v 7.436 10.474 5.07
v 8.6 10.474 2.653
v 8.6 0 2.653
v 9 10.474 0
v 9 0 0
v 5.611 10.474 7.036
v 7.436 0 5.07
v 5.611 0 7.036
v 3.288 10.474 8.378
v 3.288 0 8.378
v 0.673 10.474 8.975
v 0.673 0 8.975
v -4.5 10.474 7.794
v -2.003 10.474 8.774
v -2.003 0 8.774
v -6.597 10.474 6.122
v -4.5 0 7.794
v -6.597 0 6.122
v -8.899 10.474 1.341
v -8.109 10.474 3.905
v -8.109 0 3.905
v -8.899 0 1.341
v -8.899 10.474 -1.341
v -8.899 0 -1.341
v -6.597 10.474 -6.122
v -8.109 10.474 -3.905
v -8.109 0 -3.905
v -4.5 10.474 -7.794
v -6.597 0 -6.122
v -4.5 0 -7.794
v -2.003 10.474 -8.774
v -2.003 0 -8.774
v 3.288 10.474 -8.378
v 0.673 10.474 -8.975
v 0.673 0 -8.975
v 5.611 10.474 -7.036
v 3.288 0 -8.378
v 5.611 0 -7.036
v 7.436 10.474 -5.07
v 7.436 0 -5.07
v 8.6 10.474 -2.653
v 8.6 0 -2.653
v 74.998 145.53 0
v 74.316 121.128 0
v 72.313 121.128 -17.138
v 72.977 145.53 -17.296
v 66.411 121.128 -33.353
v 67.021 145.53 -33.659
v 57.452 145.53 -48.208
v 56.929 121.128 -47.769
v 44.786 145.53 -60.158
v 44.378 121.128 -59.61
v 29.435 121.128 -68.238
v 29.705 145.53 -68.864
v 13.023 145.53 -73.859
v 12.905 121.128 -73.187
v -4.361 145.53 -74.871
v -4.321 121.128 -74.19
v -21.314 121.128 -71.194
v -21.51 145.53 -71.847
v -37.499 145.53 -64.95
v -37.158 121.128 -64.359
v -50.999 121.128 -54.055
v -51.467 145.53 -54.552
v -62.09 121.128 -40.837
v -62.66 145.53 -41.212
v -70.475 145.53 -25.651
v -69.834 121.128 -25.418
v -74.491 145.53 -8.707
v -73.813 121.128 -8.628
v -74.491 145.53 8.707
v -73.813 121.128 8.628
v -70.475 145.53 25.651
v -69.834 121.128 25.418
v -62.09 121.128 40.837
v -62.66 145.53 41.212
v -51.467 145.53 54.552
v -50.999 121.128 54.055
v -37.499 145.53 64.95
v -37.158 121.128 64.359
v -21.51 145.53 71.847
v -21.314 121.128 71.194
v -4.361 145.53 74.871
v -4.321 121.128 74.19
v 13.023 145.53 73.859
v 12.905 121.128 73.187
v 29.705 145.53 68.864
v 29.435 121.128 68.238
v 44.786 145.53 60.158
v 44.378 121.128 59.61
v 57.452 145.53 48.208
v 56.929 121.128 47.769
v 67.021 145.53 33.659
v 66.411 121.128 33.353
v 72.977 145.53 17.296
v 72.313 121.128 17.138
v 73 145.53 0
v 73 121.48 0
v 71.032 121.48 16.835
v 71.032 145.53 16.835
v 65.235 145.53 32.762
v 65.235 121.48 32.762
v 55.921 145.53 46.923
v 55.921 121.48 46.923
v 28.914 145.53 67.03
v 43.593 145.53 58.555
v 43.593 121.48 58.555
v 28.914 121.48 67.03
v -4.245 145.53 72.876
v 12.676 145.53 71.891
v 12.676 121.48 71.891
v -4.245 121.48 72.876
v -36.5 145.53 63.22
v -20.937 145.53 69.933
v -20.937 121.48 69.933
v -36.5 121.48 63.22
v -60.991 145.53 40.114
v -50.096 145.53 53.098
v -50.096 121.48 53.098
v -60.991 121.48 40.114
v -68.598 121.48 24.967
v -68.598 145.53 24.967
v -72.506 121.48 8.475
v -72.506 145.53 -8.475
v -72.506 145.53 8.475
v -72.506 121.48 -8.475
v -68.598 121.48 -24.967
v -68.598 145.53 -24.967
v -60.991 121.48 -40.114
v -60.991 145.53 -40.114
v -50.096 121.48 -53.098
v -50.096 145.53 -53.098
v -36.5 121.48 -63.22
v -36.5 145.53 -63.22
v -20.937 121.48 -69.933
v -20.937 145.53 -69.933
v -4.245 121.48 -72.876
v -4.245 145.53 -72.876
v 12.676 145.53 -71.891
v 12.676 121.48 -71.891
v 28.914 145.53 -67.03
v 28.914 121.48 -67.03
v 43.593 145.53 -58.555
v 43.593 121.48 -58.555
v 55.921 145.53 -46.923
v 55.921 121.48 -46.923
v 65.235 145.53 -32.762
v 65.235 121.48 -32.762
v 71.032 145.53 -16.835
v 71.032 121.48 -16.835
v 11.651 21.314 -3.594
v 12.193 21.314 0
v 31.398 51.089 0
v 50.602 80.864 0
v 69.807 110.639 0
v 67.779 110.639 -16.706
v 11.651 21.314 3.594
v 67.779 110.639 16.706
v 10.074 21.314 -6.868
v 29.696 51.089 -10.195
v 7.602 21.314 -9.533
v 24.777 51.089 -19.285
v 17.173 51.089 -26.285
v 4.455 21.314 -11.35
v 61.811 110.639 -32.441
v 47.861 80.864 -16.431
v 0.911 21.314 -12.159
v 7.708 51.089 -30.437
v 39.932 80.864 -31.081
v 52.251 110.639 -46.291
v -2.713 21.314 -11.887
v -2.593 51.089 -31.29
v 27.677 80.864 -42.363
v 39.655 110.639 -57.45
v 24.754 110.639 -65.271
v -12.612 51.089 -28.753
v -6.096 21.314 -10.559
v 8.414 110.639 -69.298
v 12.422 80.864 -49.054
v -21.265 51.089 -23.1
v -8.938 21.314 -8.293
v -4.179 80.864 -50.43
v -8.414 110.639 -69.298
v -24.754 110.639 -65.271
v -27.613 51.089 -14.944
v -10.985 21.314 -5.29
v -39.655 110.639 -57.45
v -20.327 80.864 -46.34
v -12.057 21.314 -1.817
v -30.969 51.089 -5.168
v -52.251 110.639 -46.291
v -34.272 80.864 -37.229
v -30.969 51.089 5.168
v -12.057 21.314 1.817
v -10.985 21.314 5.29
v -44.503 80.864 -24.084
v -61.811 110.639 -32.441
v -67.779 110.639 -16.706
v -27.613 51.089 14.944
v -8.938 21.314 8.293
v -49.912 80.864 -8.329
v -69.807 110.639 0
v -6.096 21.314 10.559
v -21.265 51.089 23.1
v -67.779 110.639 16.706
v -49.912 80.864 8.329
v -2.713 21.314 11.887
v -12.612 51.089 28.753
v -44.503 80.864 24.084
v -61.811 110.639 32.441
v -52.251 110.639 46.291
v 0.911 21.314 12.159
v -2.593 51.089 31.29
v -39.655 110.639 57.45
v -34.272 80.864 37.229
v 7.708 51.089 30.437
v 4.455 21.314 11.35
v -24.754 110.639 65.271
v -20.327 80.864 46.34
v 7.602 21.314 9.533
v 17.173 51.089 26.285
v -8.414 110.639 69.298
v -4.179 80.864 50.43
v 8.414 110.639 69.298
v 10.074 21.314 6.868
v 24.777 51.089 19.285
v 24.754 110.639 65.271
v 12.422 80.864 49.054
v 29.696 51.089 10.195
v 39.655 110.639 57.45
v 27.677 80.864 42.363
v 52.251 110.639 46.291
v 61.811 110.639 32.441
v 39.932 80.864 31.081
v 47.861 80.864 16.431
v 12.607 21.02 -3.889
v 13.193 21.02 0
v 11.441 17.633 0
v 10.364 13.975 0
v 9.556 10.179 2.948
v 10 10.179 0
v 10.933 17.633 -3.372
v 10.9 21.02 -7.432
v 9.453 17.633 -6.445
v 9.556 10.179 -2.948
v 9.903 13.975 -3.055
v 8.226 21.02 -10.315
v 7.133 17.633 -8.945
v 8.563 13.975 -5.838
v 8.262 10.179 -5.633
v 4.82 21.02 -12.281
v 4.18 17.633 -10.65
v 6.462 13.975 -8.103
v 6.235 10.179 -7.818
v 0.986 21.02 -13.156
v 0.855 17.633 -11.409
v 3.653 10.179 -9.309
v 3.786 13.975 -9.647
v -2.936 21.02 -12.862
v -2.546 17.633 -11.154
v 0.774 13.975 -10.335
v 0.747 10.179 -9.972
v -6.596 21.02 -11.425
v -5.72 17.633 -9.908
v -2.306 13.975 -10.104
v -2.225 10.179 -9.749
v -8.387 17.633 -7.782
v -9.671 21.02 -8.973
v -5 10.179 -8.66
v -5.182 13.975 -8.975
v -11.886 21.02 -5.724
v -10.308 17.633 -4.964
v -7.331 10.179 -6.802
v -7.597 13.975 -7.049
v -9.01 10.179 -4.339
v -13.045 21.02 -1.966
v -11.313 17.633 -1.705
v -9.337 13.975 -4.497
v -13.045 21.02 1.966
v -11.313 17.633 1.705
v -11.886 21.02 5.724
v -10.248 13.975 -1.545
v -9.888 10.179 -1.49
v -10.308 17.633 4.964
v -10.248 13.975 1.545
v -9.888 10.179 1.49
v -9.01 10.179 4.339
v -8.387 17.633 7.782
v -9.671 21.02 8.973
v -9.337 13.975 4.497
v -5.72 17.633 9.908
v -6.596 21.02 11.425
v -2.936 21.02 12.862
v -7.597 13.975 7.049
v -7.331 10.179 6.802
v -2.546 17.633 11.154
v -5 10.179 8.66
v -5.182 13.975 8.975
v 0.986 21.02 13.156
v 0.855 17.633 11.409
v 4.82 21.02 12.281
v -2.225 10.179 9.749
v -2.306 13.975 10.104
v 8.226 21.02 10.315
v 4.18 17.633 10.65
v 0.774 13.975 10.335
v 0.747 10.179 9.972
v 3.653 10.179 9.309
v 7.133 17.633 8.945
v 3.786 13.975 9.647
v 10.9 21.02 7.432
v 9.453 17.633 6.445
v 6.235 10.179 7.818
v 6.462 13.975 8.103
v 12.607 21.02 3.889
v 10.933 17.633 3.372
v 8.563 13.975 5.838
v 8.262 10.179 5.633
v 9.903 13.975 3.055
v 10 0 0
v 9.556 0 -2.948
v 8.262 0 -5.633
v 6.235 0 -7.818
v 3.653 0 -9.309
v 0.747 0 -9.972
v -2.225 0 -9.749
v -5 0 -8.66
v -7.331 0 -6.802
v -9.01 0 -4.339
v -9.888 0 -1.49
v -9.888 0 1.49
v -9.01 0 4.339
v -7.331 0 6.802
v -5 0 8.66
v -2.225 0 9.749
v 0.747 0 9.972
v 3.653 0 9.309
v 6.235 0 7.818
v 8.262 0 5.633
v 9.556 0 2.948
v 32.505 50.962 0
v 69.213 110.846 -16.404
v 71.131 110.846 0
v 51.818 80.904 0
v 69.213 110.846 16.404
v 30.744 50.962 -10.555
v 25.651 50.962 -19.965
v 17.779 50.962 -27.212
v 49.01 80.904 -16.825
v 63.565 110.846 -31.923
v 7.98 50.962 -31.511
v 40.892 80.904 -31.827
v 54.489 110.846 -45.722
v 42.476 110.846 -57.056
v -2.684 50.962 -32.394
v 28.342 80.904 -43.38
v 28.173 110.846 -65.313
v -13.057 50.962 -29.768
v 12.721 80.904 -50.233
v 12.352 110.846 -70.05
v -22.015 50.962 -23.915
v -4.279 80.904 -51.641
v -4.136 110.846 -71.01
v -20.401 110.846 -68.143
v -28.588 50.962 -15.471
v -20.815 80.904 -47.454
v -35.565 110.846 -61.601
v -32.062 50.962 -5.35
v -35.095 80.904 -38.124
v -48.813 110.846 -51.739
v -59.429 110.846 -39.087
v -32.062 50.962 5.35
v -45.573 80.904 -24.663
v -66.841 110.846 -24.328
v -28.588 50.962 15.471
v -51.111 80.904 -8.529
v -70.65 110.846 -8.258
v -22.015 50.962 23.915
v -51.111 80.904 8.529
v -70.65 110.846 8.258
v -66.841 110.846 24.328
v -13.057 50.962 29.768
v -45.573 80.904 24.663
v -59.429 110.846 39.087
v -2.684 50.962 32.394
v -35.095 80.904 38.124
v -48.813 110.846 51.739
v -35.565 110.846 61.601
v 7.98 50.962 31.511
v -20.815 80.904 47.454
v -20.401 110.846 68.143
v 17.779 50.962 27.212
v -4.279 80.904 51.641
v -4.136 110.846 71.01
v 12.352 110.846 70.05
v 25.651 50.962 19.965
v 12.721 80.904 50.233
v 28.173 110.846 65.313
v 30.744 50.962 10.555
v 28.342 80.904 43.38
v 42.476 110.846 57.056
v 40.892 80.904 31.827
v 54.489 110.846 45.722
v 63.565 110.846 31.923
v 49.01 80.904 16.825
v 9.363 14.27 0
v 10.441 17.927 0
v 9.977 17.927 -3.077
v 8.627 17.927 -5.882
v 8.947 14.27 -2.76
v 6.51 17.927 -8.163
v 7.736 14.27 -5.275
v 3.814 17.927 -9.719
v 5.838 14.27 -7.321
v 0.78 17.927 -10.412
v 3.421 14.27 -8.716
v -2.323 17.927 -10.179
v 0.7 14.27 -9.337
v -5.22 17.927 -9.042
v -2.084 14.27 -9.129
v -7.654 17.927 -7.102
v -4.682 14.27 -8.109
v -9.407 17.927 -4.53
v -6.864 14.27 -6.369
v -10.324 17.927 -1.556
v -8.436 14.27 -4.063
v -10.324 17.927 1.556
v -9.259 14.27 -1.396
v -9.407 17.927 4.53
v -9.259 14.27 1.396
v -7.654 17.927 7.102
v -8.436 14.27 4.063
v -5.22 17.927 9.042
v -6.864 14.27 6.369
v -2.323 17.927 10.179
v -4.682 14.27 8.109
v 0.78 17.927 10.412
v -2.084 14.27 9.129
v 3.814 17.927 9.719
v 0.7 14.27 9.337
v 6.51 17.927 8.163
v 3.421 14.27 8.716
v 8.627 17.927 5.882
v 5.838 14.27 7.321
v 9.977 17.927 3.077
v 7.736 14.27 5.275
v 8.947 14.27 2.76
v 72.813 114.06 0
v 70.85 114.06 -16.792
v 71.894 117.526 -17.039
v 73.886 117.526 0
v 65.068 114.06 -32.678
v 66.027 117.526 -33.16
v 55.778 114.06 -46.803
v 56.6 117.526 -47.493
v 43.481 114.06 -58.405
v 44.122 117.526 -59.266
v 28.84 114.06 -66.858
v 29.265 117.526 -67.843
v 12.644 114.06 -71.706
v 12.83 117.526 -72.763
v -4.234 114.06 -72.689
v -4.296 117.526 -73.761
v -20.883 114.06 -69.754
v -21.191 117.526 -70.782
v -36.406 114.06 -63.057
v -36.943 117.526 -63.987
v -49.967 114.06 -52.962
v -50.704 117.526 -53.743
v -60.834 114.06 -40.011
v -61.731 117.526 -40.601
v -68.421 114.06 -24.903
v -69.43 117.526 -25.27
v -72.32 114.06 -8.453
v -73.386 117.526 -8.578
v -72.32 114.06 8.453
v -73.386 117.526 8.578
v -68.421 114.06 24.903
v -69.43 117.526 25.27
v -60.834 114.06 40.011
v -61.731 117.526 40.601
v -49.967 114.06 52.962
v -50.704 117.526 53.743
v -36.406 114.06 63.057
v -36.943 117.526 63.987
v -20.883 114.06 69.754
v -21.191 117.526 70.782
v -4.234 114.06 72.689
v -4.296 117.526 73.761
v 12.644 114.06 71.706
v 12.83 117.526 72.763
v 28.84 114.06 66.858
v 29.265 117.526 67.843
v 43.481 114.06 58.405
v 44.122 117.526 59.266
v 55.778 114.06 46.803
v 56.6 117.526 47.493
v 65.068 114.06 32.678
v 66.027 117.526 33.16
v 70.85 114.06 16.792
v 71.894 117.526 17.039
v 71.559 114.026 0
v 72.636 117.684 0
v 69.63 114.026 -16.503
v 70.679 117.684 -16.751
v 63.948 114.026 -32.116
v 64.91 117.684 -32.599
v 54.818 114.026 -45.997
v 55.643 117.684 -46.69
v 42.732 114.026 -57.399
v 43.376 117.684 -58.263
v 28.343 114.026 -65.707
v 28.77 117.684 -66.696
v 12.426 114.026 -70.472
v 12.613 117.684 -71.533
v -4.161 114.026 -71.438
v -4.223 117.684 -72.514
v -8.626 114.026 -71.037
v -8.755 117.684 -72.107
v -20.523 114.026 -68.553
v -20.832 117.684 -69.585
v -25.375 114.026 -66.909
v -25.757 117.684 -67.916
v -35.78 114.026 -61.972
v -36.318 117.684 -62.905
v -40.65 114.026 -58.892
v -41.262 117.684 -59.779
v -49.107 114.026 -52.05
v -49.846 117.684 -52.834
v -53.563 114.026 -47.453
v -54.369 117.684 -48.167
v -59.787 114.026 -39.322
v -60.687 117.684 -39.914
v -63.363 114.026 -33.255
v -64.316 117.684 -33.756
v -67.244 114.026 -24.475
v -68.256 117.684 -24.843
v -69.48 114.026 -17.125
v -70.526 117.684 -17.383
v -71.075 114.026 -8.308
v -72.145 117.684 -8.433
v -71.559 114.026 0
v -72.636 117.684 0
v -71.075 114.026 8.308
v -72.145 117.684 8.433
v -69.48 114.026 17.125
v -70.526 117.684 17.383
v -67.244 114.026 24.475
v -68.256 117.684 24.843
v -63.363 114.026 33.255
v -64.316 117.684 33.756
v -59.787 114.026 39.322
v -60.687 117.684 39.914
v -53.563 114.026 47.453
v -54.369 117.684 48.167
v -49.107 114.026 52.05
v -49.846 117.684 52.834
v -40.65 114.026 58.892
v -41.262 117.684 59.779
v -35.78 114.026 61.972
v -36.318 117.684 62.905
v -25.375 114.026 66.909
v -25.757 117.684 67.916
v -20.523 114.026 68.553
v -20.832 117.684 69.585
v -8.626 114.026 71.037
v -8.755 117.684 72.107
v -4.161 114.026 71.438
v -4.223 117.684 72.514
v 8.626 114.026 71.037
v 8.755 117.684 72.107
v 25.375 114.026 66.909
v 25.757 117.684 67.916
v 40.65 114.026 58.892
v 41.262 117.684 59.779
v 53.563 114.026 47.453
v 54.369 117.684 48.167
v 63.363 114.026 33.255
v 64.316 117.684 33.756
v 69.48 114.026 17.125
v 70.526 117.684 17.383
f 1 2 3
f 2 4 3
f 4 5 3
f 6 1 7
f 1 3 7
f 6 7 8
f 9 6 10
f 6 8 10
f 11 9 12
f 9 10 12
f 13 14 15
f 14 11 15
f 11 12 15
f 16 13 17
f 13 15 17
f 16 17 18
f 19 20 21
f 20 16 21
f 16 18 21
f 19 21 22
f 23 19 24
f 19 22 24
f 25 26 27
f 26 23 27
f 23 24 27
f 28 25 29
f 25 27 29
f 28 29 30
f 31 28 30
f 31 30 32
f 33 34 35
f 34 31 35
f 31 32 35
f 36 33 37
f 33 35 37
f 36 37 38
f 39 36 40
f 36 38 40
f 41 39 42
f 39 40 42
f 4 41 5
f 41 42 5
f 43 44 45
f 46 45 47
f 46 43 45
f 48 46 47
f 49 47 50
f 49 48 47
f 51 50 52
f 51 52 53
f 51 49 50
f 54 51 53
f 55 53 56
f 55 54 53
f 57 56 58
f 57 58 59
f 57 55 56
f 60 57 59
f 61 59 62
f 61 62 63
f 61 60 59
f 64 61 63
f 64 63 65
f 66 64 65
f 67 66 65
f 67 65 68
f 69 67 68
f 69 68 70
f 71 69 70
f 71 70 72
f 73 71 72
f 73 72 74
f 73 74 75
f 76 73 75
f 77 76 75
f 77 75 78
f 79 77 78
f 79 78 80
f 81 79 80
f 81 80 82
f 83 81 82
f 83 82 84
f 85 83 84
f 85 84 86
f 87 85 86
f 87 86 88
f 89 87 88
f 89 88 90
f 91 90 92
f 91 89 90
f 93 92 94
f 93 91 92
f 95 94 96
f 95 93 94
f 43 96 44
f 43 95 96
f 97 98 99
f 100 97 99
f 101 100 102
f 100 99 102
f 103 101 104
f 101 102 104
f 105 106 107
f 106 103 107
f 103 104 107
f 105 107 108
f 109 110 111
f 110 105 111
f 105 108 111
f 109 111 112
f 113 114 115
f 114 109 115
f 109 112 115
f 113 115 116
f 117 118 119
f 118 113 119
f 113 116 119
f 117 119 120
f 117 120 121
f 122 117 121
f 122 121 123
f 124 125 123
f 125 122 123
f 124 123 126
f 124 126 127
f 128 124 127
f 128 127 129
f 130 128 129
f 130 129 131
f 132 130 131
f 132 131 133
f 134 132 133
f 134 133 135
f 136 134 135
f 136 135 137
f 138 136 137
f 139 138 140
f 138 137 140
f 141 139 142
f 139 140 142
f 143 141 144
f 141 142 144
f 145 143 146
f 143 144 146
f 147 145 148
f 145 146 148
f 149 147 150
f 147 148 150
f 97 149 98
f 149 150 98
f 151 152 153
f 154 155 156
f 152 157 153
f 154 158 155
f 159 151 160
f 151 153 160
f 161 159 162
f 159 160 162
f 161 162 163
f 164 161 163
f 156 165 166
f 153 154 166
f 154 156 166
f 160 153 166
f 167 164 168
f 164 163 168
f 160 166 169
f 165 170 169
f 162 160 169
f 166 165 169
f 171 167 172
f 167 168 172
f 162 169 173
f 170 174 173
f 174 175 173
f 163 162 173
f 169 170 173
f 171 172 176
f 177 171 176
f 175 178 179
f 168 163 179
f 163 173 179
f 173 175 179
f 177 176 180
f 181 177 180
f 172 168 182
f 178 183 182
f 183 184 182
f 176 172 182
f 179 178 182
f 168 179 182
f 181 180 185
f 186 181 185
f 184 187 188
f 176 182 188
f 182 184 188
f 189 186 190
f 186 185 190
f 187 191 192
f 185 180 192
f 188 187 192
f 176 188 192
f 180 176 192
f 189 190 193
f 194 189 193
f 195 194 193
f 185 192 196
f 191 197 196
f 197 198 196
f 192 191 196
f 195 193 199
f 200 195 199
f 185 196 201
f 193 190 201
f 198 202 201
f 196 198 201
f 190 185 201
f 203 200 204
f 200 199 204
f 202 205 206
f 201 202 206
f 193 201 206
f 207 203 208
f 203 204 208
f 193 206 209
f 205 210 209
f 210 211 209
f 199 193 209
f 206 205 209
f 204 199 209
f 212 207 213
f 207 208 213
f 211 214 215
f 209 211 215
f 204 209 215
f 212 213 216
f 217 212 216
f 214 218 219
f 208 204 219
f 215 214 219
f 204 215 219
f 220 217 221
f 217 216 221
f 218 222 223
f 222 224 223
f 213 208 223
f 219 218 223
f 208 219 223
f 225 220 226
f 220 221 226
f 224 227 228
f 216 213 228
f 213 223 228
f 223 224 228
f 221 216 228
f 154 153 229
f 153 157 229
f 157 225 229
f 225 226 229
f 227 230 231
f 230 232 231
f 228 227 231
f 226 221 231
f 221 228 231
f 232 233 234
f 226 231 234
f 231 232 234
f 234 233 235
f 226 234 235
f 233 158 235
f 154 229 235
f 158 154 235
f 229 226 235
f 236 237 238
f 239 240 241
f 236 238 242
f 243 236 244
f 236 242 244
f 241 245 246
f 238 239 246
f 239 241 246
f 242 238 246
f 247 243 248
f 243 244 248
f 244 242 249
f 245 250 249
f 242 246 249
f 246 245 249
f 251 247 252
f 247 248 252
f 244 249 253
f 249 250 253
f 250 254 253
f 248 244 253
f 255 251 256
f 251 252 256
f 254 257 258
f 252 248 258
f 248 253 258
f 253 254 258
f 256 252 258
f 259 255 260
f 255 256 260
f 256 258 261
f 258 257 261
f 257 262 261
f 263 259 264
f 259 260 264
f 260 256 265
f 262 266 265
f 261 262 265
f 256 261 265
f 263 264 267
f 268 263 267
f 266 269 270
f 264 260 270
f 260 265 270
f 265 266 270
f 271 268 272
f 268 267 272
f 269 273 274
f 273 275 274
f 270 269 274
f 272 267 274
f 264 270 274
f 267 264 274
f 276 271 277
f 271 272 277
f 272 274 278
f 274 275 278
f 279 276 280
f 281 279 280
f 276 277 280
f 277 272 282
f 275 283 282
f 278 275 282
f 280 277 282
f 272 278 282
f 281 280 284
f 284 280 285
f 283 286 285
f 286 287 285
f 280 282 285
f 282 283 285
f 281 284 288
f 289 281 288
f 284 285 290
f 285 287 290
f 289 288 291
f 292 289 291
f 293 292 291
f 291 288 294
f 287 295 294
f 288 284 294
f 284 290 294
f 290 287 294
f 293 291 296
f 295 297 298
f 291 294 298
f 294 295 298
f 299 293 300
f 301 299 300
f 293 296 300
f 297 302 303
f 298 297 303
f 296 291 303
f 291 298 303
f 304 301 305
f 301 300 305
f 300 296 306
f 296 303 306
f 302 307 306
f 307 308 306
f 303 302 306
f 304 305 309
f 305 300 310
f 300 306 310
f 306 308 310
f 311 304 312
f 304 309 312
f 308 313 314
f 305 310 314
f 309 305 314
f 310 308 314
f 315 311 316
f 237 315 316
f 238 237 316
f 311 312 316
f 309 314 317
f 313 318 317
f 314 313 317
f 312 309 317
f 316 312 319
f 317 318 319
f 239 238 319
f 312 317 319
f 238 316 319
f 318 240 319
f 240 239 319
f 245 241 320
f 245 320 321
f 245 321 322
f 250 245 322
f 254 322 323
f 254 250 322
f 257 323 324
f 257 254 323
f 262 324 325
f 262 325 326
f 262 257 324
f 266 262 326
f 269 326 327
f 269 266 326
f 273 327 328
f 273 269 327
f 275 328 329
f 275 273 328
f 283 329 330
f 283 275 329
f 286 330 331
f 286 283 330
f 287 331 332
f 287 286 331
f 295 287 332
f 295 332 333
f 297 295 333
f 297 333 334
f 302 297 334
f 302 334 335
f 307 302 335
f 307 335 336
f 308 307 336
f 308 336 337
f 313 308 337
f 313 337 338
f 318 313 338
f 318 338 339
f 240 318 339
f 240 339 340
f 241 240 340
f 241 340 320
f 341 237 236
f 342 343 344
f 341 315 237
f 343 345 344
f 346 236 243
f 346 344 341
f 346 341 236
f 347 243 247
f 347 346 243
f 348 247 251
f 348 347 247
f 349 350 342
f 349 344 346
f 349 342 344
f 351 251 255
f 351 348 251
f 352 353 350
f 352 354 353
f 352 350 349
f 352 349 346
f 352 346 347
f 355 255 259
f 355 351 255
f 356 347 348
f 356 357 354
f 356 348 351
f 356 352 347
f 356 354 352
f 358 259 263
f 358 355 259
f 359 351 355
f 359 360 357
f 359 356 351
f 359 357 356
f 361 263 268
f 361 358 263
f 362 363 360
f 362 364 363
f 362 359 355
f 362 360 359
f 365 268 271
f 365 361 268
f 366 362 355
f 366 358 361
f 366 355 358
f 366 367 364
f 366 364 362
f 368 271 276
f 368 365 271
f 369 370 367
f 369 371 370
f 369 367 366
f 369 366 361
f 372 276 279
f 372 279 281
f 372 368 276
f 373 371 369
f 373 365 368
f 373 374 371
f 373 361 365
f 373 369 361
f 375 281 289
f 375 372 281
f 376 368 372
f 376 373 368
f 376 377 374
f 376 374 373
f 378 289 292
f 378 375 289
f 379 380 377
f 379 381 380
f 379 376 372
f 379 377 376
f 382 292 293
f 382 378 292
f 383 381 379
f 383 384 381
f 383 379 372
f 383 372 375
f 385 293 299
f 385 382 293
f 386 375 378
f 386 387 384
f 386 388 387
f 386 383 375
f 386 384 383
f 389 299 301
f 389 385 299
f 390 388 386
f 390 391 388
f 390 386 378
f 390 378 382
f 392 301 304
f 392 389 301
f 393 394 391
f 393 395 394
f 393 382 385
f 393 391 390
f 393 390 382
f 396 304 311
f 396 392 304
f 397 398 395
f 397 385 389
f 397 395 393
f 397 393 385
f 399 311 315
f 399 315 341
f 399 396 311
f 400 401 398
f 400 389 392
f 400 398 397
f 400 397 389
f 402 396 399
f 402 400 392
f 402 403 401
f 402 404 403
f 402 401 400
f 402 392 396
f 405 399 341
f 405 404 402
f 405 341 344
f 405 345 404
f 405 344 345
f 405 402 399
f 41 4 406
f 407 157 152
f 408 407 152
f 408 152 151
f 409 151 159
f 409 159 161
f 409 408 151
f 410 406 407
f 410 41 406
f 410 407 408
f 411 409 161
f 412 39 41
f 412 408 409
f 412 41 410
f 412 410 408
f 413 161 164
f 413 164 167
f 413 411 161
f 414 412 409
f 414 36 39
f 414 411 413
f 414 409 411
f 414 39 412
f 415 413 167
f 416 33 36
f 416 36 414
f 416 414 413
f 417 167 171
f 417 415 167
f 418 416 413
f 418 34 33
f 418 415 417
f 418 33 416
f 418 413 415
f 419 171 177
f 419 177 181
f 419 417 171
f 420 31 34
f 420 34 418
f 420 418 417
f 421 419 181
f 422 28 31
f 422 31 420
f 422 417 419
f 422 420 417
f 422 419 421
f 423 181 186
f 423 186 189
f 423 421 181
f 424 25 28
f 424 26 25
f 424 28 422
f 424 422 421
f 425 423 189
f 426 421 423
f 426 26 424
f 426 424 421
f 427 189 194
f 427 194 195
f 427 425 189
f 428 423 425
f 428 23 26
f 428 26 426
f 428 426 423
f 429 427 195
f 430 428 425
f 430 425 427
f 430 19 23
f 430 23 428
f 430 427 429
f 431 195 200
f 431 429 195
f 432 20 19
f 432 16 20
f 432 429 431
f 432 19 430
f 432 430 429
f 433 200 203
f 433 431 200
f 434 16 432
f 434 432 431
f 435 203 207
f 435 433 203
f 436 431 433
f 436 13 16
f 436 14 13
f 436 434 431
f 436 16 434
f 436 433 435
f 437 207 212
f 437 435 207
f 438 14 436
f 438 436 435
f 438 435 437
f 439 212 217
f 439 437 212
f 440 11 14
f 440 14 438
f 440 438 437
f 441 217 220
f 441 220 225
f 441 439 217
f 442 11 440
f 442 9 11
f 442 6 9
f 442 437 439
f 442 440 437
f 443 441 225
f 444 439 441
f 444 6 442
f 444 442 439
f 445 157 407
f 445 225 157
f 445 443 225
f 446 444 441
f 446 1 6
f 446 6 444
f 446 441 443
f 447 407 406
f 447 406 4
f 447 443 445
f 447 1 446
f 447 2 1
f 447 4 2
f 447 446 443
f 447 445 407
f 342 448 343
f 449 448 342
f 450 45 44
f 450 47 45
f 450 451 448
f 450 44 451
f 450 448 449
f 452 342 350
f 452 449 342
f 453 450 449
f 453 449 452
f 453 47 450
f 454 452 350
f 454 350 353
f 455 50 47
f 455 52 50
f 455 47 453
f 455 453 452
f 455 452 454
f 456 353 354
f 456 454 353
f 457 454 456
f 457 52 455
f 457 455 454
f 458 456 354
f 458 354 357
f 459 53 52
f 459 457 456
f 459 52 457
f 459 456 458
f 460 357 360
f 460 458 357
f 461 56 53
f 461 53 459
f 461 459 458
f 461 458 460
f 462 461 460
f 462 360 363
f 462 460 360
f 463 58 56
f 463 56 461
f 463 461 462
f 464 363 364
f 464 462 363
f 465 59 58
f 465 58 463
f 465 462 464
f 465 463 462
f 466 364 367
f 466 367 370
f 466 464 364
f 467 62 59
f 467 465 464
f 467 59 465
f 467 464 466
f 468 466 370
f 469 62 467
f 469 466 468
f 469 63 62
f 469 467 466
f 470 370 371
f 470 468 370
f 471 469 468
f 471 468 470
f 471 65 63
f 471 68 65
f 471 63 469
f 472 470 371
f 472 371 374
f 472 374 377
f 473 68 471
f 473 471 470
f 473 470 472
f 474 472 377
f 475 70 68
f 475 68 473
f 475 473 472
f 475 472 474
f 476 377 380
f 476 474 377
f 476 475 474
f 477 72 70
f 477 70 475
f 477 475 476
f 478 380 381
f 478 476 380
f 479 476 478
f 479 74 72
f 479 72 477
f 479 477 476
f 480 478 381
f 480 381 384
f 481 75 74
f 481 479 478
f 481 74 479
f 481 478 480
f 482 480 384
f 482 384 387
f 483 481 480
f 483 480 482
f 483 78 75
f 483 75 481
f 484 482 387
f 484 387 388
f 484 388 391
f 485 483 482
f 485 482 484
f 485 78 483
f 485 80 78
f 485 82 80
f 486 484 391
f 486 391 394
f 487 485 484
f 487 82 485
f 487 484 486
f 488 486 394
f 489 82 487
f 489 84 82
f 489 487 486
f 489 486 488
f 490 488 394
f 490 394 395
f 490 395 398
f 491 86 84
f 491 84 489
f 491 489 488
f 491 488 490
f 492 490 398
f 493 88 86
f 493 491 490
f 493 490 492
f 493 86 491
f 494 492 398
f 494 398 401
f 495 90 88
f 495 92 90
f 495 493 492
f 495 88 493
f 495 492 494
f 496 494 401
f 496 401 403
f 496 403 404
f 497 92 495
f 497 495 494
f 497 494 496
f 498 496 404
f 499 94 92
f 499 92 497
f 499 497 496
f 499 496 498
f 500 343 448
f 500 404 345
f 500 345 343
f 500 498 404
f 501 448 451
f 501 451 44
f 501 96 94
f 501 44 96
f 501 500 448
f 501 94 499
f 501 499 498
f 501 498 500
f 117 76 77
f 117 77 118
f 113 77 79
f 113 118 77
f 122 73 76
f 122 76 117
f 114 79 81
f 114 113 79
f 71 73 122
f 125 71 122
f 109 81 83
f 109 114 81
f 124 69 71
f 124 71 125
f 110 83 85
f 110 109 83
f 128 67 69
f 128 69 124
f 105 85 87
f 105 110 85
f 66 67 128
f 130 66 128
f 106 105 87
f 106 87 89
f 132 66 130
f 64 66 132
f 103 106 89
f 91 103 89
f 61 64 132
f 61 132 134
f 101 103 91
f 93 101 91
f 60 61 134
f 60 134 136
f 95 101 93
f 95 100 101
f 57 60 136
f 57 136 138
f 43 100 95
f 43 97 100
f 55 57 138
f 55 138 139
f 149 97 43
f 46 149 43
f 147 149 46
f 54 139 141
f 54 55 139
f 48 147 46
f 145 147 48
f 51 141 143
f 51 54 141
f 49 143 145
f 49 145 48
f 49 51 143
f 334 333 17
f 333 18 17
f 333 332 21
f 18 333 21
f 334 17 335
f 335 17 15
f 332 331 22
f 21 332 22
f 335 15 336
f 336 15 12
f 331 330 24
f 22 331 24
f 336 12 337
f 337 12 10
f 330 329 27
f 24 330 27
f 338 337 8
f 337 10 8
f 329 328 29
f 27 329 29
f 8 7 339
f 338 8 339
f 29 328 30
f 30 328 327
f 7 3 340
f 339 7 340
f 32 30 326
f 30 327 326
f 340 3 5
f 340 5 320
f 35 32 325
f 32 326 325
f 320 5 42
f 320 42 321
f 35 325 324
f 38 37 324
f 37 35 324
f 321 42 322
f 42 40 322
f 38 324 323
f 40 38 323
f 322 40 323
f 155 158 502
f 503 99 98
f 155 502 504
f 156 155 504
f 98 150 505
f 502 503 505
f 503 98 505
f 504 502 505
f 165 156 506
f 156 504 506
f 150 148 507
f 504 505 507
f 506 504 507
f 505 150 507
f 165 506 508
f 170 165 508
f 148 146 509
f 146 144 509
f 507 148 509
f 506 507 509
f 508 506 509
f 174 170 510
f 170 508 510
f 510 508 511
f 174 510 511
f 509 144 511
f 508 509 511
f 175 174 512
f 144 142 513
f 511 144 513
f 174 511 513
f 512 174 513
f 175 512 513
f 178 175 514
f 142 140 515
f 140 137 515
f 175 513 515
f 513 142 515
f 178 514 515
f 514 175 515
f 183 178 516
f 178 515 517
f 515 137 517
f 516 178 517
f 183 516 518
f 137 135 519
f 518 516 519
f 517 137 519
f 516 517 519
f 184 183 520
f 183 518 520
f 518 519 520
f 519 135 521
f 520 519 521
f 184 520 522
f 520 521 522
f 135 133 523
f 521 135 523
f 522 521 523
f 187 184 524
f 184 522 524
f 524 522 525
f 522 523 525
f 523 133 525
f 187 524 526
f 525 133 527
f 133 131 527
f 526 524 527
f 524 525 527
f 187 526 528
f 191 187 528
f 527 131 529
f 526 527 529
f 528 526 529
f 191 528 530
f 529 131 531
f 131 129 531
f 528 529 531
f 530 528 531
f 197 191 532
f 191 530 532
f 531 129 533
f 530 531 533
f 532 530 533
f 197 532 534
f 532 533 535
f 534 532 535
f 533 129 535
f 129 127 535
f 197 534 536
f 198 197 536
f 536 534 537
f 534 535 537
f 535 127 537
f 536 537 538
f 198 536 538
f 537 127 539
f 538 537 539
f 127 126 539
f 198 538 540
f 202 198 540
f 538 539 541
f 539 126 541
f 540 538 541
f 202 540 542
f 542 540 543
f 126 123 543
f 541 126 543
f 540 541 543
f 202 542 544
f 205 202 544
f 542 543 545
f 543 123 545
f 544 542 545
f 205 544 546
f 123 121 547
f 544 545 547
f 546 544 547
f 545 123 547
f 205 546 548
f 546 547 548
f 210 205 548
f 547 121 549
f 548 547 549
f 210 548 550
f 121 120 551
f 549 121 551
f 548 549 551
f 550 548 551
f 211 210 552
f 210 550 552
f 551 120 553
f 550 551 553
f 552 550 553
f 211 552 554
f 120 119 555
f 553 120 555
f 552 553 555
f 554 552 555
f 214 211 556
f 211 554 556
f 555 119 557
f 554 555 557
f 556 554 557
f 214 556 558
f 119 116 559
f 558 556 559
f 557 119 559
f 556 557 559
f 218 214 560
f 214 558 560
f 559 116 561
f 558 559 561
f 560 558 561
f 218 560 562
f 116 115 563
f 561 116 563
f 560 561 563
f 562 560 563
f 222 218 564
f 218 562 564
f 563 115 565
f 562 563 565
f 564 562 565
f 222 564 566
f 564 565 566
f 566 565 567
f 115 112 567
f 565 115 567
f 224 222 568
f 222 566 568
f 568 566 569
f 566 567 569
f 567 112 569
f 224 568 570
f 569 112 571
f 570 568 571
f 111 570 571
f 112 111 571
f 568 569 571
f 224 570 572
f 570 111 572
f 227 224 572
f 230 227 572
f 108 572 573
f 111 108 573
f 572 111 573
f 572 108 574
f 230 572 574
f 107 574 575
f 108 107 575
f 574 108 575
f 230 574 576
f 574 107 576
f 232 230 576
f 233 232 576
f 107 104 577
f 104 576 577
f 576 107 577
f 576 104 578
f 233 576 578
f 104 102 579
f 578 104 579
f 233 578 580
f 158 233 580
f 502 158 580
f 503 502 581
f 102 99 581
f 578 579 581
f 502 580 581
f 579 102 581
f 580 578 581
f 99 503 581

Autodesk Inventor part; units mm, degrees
ref_plane "YZ Plane" through (0, 0, 0) normal (1, 0, 0) x (0, 1, 0)
ref_plane "XZ Plane" through (0, 0, 0) normal (0, 1, 0) x (-1, 0, 0)
ref_plane "XY Plane" through (0, 0, 0) normal (0, 0, 1) x (1, 0, 0)
sketch "Sketch1" plane through (0, 0, 0) normal (0, 0, 1) x (1, 0, 0)
  line L0 (0, 0) -> (0, 20)
  line L1 (0, 0) -> (0, 145)
  line L2 (74.9981, 145.5303) -> (74.1596, 115.542)
  line L3 (10, 0) -> (10, 10.1792)
  line L4 (13.1928, 21.0198) -> (71.1308, 110.8462)
  line L5 (73, 145.5303) -> (73, 121.4795)
  line L6 (69.8072, 110.6389) -> (12.1928, 21.3144)
  line L7 (9, 10.4737) -> (9, 0)
  line L8 (9, 0) -> (10, 0)
  line L9 (73, 145.5303) -> (74.9981, 145.5303)
  arc A0 (69.8072, 110.6389) -> (73, 121.4795) centre (53, 121.4795) ccw
  arc A1 (71.1308, 110.8462) -> (74.3158, 121.1278) centre (54.3236, 121.6868) ccw
  arc A2 (13.1928, 21.0198) -> (10, 10.1792) centre (30, 10.1792) ccw
  arc A3 (12.1928, 21.3144) -> (9, 10.4737) centre (29, 10.4737) ccw
  dimension "d0" = 20
  dimension "d4" = 10
  dimension "d16" = 75
  dimension "d20" = 1
  dimension "d21" = 20
  dimension "d26" = 30
  dimension "d27" = 89.8263
  dimension "d28" = 106.8905
  dimension "d29" = 10.4738
revolve "Revolution1" add sketch "Sketch1" angle 360 about axis through (0, 0, 0) along (0, 1, 0)
properties part number "Funnel 2" material "PET Plastic"
